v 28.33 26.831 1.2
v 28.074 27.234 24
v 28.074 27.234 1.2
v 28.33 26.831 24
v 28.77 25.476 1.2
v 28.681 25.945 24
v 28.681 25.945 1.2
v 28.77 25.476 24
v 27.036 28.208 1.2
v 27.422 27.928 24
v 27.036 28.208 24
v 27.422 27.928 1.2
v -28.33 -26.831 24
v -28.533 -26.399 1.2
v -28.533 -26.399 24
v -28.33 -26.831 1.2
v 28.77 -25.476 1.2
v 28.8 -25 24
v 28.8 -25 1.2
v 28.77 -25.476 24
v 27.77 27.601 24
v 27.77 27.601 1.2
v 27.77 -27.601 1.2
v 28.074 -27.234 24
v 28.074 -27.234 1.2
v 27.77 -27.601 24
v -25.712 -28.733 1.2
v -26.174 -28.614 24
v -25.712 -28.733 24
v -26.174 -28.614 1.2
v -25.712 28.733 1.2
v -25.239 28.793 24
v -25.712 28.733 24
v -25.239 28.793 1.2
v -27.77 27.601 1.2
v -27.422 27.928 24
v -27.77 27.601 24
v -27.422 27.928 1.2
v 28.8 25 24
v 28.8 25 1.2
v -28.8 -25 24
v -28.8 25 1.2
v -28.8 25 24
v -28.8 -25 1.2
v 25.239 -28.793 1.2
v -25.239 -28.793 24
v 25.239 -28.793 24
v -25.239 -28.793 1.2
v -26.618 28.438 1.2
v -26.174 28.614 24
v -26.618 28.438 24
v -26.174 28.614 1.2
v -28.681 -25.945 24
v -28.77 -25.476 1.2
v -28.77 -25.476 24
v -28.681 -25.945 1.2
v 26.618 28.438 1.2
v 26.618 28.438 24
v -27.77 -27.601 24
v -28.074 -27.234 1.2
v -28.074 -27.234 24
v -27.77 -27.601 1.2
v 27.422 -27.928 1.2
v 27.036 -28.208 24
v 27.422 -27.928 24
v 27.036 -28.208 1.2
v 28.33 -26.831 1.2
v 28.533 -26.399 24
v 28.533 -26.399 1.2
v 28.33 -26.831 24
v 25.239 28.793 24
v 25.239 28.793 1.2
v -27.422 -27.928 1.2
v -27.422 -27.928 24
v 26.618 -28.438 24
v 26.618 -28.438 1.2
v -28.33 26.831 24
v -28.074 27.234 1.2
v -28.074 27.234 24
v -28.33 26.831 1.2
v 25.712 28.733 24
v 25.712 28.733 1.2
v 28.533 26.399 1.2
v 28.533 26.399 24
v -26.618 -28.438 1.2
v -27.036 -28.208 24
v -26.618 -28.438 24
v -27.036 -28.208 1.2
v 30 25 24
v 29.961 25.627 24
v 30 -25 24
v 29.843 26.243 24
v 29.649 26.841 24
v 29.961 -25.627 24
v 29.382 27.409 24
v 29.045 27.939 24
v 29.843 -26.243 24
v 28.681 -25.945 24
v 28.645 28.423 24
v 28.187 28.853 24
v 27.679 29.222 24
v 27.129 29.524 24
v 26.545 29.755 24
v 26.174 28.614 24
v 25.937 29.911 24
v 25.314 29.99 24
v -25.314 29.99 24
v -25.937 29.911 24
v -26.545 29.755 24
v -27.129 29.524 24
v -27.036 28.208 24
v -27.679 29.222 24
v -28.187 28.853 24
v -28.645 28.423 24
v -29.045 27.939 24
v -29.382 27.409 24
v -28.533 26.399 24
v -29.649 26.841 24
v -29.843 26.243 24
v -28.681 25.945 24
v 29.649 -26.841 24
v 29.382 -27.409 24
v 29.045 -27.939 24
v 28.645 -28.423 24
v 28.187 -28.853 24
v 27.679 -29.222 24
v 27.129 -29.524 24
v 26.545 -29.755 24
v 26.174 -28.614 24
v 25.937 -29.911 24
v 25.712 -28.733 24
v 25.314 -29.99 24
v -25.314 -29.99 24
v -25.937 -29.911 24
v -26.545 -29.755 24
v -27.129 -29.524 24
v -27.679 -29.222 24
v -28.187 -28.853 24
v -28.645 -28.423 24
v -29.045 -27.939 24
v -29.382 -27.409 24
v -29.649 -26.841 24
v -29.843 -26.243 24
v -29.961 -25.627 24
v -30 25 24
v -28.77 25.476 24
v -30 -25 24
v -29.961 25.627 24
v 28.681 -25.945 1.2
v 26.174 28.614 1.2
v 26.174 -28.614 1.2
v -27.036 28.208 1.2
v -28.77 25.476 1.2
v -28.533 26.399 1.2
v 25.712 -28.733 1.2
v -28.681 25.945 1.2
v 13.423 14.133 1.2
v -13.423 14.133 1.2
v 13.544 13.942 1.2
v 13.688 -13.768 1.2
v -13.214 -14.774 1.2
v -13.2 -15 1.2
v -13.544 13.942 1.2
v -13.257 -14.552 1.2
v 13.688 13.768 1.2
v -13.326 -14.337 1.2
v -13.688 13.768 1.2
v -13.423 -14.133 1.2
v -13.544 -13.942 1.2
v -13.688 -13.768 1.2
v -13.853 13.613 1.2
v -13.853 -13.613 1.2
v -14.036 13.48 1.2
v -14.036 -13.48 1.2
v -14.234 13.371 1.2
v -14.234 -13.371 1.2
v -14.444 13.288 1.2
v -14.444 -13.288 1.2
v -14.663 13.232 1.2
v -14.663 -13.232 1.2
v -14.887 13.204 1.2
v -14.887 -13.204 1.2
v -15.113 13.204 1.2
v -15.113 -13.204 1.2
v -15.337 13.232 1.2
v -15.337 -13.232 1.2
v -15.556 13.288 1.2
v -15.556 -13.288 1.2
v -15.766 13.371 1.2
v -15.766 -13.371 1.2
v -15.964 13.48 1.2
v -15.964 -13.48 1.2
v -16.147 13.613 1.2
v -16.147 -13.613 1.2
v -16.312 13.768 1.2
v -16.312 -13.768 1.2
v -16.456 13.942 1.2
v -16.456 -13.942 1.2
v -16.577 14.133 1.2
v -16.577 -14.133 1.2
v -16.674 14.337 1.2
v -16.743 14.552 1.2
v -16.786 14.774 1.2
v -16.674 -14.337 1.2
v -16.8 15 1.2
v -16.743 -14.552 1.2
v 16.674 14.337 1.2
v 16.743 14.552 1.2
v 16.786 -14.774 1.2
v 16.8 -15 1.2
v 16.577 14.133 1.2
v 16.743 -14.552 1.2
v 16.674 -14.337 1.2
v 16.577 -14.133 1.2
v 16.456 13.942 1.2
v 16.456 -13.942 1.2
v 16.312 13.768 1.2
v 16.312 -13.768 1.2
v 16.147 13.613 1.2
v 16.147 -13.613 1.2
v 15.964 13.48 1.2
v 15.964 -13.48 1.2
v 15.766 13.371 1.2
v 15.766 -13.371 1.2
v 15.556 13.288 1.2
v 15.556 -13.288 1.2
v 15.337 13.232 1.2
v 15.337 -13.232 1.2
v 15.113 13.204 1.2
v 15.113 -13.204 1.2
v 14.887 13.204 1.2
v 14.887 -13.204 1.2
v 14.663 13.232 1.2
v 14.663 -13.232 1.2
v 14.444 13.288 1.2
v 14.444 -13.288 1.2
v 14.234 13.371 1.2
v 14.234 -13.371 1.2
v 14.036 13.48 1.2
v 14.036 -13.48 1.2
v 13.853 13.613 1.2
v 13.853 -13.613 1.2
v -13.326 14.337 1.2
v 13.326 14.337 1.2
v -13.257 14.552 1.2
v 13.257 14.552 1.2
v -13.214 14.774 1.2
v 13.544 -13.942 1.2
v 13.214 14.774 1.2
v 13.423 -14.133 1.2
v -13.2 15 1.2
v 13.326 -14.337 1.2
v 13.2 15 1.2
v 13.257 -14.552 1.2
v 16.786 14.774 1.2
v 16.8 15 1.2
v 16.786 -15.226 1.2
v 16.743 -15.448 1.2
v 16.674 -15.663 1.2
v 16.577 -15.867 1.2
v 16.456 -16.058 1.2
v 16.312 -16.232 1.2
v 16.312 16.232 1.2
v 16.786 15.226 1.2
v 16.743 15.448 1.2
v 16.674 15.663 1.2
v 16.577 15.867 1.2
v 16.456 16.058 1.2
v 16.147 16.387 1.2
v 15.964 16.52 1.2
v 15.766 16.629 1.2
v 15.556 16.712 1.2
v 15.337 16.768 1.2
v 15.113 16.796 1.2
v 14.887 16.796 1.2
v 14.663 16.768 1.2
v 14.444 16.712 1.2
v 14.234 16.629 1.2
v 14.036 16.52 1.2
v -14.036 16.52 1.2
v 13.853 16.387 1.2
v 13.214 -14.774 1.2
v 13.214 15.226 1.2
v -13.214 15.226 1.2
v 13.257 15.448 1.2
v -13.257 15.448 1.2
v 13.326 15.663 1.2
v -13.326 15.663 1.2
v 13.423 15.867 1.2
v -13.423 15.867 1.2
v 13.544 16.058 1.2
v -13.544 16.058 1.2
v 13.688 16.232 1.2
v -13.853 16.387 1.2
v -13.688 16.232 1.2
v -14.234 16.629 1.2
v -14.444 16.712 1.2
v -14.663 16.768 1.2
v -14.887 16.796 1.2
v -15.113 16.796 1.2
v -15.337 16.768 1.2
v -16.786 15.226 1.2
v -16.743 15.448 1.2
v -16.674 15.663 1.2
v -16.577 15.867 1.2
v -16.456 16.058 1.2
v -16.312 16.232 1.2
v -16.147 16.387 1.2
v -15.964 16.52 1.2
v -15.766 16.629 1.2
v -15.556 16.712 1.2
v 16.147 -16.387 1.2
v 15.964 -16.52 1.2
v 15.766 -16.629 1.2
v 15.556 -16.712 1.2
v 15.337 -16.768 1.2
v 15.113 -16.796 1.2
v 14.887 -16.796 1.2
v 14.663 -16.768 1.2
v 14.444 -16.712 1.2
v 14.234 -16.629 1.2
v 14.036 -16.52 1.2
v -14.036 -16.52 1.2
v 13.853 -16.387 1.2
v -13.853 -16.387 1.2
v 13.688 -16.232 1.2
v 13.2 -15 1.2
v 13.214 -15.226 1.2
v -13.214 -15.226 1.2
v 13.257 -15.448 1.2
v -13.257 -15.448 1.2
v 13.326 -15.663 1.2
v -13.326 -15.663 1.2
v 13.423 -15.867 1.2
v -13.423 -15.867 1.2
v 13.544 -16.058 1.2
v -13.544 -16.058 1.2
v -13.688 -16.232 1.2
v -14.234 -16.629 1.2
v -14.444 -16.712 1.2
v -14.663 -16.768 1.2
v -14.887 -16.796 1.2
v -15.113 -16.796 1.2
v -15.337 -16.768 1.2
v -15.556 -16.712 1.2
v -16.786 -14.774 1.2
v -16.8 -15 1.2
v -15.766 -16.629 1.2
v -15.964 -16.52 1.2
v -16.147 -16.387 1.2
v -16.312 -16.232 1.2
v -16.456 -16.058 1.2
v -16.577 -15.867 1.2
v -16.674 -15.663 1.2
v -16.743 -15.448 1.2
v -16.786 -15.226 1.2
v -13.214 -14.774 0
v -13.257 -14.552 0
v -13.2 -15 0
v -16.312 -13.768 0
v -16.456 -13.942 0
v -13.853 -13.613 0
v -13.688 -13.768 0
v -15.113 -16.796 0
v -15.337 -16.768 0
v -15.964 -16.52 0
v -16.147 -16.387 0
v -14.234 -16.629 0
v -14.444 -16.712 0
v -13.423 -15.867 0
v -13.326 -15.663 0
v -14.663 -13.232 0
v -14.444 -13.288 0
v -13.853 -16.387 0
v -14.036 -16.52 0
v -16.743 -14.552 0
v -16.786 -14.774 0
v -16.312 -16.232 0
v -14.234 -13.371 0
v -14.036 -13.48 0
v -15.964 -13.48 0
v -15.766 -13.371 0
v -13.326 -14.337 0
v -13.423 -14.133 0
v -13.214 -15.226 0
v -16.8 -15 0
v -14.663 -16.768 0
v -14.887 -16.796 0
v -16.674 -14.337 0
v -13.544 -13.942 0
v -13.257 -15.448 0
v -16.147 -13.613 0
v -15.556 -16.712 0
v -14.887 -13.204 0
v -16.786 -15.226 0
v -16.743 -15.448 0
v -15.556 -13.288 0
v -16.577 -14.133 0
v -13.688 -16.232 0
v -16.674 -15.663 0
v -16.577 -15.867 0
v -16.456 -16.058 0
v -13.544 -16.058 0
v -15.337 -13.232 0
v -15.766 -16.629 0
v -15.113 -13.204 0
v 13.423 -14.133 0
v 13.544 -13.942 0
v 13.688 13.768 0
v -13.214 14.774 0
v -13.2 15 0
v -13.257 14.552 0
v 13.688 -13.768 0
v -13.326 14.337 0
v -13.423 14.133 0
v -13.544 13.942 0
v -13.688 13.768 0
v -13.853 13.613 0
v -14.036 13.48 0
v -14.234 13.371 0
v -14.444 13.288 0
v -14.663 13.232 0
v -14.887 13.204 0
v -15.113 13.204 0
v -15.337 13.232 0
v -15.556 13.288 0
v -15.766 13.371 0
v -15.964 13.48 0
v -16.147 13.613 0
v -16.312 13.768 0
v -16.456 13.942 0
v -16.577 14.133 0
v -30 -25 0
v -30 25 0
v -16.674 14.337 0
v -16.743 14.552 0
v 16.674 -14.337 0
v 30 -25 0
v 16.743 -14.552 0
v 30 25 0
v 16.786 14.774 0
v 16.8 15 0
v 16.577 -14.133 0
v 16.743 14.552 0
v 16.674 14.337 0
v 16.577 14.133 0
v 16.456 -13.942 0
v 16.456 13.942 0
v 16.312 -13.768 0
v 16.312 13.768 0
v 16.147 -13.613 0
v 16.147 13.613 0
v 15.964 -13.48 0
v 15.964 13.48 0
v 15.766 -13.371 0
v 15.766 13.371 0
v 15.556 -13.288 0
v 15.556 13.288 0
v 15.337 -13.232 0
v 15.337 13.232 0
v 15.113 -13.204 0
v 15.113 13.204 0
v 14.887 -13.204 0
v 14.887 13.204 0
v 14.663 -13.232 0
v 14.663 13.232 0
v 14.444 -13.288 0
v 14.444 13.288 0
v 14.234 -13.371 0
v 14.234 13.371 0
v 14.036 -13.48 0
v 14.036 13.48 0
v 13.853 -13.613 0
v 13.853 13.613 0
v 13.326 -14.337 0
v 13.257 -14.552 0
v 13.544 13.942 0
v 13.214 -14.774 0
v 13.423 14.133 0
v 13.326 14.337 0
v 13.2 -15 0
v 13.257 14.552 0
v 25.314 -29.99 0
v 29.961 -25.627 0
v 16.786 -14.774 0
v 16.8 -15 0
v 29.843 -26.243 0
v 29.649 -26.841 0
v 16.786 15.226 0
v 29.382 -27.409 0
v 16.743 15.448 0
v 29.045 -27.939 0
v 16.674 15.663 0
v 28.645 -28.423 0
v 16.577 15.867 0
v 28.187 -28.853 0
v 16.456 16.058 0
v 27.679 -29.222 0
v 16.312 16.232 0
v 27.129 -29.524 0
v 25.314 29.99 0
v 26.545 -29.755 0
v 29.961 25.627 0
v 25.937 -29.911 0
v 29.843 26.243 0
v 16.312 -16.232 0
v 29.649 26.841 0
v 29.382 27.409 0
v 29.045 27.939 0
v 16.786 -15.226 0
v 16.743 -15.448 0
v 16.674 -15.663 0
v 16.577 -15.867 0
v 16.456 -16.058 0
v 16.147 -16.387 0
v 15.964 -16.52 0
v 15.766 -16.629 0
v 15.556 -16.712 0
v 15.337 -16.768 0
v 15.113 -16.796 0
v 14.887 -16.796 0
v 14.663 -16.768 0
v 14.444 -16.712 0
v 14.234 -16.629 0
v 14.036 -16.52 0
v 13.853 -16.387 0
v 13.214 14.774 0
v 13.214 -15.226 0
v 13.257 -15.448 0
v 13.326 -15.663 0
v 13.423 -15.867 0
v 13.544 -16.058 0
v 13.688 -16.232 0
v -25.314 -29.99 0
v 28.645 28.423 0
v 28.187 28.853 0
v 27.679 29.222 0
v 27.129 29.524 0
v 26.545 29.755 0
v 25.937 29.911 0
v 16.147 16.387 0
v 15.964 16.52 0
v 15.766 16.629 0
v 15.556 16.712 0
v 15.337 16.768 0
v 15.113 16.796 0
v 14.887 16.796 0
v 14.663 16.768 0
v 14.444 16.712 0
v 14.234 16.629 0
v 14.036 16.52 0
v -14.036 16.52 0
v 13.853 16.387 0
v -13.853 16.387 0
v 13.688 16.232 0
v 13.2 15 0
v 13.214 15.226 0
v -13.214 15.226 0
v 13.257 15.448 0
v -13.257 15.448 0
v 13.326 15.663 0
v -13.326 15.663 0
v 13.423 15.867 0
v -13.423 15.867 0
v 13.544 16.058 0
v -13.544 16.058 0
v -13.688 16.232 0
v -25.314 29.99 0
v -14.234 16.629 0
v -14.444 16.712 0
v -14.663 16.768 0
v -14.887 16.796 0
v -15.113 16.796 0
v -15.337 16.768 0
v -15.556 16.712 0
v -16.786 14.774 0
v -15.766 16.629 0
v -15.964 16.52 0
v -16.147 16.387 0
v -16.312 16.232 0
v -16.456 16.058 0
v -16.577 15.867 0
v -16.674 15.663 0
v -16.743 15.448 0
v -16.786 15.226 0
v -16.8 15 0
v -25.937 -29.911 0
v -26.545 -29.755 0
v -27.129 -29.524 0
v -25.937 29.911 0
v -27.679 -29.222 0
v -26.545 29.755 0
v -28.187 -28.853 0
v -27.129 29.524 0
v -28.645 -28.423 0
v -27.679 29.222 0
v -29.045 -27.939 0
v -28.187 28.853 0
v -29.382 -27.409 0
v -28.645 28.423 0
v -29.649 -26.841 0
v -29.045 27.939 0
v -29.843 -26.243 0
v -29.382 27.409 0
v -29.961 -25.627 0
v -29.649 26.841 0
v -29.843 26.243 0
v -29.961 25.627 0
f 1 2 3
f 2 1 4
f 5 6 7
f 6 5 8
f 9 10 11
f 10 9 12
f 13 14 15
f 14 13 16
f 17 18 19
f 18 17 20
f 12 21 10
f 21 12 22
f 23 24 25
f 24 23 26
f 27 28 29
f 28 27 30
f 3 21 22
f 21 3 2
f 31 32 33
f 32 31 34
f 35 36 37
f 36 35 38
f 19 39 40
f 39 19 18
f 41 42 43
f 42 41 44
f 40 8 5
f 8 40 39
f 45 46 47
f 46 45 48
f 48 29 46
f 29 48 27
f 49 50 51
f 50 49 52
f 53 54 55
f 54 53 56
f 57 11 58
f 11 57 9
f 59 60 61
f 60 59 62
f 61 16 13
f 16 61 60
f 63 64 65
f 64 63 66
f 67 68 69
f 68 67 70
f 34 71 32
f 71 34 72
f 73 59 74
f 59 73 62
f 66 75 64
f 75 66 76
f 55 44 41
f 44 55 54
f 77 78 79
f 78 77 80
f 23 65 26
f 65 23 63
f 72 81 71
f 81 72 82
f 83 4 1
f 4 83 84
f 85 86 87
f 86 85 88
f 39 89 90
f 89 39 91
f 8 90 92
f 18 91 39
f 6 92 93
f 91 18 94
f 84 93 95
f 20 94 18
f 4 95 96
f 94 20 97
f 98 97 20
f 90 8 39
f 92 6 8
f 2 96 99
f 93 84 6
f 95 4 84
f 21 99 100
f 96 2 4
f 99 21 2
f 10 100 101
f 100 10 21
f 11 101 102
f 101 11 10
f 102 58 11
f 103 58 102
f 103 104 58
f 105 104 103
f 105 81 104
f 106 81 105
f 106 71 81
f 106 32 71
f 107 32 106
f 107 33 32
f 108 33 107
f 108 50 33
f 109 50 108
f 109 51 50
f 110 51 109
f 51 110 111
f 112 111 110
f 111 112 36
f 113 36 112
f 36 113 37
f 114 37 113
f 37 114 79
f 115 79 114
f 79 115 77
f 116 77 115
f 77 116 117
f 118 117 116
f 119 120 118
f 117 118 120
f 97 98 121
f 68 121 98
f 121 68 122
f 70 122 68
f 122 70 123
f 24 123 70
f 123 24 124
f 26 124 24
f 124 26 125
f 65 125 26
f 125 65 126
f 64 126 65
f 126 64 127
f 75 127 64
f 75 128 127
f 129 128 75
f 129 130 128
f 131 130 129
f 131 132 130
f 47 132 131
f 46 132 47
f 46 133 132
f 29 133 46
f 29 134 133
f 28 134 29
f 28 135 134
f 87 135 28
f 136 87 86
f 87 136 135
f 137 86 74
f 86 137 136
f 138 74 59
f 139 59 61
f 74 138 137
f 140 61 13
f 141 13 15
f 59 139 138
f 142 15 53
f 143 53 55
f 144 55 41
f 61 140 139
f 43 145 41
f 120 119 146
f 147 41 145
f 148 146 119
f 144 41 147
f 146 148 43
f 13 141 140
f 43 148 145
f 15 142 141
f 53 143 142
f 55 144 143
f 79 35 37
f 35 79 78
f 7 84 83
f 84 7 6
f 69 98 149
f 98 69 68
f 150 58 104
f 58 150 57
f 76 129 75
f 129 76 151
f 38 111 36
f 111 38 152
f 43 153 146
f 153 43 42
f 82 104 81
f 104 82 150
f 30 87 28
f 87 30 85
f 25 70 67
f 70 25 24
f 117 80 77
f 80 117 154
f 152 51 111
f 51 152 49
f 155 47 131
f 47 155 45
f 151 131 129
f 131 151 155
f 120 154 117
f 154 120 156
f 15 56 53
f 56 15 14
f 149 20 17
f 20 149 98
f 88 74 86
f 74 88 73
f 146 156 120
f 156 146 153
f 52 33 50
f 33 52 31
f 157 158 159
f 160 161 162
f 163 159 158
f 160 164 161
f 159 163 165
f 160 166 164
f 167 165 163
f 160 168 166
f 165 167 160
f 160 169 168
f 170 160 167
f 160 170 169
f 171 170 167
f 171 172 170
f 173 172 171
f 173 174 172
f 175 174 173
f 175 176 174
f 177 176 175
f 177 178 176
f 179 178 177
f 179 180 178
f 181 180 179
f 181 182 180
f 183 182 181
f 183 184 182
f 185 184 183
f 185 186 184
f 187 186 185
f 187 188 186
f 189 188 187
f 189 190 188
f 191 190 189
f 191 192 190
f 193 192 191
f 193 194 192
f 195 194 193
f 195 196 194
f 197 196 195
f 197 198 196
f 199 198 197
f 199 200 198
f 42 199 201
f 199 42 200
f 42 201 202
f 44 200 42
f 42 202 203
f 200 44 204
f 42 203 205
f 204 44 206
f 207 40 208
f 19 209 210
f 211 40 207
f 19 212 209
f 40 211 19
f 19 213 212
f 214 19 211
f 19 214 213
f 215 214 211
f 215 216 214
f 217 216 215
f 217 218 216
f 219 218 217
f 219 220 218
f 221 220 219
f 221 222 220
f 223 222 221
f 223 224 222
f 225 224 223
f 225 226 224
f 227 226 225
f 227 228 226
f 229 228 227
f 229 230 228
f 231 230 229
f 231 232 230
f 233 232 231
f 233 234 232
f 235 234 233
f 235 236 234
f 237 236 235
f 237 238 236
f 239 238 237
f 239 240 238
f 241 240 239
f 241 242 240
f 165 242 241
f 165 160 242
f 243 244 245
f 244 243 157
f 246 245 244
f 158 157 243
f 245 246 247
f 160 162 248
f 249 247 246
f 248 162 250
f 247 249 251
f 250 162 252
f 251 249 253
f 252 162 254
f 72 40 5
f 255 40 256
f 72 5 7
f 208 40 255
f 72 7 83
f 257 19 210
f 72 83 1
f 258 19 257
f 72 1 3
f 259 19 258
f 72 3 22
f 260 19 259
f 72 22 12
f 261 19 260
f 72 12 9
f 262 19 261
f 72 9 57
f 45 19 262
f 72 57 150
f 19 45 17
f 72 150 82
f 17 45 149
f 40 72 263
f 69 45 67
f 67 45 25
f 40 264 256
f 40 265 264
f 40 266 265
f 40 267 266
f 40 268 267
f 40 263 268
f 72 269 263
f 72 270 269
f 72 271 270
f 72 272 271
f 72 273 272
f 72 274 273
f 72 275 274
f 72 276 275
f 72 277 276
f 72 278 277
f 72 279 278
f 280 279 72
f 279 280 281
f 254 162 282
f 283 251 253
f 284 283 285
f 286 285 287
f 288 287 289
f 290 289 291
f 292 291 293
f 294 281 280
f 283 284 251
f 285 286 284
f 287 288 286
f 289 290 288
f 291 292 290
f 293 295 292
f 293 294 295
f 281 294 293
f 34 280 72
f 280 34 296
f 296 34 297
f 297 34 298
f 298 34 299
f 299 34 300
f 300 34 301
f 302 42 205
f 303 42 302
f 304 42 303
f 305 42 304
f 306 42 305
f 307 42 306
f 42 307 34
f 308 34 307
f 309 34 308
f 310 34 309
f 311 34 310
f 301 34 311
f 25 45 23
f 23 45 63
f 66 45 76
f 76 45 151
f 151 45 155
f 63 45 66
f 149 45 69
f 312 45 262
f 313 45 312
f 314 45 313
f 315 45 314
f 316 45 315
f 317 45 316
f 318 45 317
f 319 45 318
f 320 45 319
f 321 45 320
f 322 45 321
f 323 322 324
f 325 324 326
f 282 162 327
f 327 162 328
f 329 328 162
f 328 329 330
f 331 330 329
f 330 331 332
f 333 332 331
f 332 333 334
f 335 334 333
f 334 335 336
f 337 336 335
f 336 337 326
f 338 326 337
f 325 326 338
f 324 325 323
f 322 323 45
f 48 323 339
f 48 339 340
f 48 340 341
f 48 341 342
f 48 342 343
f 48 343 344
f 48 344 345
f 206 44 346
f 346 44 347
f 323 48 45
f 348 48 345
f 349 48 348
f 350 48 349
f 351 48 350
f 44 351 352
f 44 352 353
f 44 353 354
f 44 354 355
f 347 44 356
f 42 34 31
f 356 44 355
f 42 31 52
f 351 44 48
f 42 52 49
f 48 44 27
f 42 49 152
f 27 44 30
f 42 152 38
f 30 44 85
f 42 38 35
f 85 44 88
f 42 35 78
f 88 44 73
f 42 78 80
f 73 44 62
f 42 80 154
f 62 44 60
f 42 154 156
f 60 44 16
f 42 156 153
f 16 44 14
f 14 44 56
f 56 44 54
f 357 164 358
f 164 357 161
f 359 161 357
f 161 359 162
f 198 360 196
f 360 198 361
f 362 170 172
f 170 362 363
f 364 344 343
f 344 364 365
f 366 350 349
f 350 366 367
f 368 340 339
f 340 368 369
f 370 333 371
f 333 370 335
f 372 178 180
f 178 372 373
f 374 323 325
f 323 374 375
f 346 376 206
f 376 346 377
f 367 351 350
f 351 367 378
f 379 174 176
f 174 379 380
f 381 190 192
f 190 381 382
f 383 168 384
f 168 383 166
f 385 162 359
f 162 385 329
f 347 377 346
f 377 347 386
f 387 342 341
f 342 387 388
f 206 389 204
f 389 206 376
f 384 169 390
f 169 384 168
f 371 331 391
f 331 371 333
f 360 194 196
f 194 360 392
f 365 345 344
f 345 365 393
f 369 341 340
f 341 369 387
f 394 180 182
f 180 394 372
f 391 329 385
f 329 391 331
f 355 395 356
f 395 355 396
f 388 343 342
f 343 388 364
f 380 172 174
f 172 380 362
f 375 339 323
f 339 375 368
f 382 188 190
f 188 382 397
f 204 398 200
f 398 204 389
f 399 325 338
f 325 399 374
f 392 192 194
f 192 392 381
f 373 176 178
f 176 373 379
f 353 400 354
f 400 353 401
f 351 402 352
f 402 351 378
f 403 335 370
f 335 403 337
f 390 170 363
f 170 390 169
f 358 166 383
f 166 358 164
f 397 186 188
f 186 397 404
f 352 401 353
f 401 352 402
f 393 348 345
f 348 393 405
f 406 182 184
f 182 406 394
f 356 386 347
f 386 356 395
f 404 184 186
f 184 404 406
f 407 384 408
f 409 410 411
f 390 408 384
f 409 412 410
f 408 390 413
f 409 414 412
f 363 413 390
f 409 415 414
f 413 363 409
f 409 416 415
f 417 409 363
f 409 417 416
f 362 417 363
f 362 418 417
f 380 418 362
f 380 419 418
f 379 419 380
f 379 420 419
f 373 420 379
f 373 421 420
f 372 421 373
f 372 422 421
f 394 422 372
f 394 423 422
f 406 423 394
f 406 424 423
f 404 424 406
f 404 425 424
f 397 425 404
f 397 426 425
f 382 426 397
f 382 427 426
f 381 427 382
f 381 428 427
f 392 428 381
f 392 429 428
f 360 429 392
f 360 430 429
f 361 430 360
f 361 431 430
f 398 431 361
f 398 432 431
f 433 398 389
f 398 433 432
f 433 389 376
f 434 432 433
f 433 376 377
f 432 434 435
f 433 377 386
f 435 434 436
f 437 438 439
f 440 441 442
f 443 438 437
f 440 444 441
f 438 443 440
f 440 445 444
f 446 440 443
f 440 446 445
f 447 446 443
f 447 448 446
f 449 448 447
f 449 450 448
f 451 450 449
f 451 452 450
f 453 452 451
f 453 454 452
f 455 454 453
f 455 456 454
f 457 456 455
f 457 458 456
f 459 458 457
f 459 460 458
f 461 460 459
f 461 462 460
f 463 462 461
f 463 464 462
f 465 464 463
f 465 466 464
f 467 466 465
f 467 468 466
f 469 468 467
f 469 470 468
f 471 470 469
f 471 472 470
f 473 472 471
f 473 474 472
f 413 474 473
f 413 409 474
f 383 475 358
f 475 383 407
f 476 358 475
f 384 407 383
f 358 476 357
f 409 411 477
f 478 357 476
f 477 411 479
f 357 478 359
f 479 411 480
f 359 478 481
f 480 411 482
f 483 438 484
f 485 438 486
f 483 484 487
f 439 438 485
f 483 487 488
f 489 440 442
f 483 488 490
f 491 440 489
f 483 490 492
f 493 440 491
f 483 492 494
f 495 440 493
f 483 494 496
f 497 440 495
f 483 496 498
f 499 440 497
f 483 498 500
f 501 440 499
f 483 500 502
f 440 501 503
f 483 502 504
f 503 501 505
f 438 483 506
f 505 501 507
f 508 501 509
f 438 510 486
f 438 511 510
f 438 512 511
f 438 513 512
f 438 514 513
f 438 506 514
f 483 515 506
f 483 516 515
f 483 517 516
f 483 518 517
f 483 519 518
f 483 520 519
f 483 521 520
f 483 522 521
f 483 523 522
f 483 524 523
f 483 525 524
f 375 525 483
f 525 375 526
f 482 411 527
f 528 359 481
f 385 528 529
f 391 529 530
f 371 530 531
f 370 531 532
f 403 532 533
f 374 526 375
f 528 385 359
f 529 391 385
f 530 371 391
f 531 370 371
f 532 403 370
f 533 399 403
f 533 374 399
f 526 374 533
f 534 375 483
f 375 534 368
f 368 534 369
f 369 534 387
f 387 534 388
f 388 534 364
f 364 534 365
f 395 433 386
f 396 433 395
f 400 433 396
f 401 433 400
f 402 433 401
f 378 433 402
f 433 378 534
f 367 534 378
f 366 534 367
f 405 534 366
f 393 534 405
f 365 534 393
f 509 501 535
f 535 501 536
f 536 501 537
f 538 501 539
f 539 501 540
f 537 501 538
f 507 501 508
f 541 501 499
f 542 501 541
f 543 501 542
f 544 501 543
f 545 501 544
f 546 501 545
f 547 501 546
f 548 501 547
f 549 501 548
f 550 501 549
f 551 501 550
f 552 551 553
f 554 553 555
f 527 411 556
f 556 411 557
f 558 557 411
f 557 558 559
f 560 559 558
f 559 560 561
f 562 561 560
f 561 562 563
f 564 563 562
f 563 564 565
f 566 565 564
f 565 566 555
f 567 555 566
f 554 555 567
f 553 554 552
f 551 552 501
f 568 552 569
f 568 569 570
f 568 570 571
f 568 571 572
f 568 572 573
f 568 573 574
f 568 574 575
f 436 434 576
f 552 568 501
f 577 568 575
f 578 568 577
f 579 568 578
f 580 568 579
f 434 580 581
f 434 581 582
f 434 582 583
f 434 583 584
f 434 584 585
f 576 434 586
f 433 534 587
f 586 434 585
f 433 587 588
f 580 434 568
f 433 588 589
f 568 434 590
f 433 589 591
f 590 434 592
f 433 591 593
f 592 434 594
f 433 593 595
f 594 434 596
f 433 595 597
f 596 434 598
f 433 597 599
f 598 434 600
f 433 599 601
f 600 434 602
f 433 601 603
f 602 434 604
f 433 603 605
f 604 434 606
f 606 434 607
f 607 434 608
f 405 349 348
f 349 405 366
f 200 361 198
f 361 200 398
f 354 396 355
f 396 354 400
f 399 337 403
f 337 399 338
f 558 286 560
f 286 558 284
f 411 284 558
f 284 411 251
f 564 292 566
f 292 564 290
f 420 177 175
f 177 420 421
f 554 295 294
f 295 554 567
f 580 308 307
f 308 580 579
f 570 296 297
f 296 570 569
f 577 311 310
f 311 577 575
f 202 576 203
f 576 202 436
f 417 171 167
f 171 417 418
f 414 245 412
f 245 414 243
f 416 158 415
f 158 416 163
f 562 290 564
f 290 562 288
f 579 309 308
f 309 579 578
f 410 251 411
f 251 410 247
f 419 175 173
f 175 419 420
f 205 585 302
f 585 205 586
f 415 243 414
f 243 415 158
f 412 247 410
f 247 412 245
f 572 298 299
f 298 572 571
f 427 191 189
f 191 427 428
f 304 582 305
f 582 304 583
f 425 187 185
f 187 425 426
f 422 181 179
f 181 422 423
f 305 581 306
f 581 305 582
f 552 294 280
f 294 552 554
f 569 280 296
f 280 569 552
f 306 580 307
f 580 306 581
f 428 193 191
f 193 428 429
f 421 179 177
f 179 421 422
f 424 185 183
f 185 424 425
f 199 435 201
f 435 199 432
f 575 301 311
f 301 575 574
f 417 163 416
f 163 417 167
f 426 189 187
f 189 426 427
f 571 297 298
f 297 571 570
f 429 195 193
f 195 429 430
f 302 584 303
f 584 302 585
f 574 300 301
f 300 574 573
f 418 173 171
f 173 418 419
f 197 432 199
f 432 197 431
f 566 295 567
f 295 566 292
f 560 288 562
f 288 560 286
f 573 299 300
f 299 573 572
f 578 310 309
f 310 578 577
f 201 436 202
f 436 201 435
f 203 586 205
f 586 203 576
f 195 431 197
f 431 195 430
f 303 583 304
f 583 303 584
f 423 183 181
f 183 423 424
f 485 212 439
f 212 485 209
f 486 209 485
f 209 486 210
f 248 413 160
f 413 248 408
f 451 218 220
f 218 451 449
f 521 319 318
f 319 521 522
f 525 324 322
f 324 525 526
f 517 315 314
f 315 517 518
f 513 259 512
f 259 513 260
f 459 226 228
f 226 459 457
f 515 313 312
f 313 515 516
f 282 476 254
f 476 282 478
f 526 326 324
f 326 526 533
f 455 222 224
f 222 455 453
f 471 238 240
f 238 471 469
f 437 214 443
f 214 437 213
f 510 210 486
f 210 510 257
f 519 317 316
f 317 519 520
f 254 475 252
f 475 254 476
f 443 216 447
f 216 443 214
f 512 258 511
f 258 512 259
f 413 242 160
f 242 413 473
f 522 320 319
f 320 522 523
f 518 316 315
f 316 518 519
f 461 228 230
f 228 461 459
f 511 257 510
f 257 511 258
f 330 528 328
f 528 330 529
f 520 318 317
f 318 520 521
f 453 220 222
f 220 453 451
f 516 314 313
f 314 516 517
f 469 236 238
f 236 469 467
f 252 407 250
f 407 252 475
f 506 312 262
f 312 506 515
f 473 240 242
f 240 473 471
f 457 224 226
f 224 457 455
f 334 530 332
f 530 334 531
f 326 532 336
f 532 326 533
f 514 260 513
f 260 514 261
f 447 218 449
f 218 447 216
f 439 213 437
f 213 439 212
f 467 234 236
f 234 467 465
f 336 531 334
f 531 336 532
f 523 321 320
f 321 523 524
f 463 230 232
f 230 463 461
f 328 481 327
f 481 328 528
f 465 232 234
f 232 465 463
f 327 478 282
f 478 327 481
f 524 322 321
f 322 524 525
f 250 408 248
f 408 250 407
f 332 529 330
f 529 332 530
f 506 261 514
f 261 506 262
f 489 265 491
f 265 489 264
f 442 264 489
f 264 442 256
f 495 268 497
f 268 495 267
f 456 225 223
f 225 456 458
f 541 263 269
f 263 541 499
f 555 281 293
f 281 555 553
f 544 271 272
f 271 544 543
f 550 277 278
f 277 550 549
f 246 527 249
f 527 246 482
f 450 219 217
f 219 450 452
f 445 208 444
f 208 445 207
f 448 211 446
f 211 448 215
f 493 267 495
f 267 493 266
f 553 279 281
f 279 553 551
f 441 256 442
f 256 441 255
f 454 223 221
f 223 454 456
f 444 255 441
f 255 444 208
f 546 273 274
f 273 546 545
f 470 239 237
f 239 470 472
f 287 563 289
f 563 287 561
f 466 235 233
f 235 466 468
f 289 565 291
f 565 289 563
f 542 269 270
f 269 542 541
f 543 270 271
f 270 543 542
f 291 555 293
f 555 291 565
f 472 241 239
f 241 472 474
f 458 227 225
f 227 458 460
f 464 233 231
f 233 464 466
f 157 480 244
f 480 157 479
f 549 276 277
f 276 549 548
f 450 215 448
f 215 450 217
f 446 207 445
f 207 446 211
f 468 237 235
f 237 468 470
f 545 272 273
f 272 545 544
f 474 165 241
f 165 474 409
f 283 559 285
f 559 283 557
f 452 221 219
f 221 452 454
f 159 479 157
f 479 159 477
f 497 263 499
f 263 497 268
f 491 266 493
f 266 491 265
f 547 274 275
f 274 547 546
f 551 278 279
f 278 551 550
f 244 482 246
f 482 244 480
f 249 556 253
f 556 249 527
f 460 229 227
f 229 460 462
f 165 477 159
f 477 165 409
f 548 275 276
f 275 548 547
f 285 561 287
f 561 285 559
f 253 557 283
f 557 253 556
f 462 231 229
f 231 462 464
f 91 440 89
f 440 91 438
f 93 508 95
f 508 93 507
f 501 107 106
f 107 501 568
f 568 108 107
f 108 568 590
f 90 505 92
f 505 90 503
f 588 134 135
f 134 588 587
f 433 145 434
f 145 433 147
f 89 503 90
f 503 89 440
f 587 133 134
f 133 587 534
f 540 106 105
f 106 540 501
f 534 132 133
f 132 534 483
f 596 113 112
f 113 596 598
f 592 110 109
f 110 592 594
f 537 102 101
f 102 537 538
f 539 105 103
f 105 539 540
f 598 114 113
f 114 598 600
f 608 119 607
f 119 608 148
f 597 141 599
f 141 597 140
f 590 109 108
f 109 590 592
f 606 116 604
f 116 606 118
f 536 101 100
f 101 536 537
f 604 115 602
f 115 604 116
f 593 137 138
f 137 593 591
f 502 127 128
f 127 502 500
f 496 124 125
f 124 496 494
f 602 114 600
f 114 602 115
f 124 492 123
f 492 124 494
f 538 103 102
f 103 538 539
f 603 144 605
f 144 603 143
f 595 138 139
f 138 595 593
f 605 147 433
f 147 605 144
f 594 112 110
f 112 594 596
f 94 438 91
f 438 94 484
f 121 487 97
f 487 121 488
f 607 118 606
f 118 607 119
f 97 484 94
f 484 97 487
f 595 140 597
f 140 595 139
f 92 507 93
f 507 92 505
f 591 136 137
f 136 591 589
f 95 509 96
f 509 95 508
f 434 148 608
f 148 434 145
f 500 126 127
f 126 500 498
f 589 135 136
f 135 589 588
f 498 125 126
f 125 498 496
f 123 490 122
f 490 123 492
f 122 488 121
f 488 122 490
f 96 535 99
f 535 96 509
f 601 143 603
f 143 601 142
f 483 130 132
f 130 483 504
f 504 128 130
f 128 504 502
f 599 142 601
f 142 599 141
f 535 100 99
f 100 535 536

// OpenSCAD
$fn = 50;


difference() {
	union() {
		hull() {
			translate(v = [-25.0000000000, 25.0000000000, 0]) {
				cylinder(h = 24, r = 5);
			}
			translate(v = [25.0000000000, 25.0000000000, 0]) {
				cylinder(h = 24, r = 5);
			}
			translate(v = [-25.0000000000, -25.0000000000, 0]) {
				cylinder(h = 24, r = 5);
			}
			translate(v = [25.0000000000, -25.0000000000, 0]) {
				cylinder(h = 24, r = 5);
			}
		}
	}
	union() {
		translate(v = [0, 0, 1.2000000000]) {
			hull() {
				translate(v = [-25.0000000000, 25.0000000000, 0]) {
					cylinder(h = 22.8000000000, r = 3.8000000000);
				}
				translate(v = [25.0000000000, 25.0000000000, 0]) {
					cylinder(h = 22.8000000000, r = 3.8000000000);
				}
				translate(v = [-25.0000000000, -25.0000000000, 0]) {
					cylinder(h = 22.8000000000, r = 3.8000000000);
				}
				translate(v = [25.0000000000, -25.0000000000, 0]) {
					cylinder(h = 22.8000000000, r = 3.8000000000);
				}
			}
		}
		#translate(v = [-15.0000000000, -15.0000000000, 0]) {
			cylinder(h = 1.2000000000, r = 1.8000000000);
		}
		#translate(v = [-15.0000000000, 15.0000000000, 0]) {
			cylinder(h = 1.2000000000, r = 1.8000000000);
		}
		#translate(v = [15.0000000000, -15.0000000000, 0]) {
			cylinder(h = 1.2000000000, r = 1.8000000000);
		}
		#translate(v = [15.0000000000, 15.0000000000, 0]) {
			cylinder(h = 1.2000000000, r = 1.8000000000);
		}
	}
}
